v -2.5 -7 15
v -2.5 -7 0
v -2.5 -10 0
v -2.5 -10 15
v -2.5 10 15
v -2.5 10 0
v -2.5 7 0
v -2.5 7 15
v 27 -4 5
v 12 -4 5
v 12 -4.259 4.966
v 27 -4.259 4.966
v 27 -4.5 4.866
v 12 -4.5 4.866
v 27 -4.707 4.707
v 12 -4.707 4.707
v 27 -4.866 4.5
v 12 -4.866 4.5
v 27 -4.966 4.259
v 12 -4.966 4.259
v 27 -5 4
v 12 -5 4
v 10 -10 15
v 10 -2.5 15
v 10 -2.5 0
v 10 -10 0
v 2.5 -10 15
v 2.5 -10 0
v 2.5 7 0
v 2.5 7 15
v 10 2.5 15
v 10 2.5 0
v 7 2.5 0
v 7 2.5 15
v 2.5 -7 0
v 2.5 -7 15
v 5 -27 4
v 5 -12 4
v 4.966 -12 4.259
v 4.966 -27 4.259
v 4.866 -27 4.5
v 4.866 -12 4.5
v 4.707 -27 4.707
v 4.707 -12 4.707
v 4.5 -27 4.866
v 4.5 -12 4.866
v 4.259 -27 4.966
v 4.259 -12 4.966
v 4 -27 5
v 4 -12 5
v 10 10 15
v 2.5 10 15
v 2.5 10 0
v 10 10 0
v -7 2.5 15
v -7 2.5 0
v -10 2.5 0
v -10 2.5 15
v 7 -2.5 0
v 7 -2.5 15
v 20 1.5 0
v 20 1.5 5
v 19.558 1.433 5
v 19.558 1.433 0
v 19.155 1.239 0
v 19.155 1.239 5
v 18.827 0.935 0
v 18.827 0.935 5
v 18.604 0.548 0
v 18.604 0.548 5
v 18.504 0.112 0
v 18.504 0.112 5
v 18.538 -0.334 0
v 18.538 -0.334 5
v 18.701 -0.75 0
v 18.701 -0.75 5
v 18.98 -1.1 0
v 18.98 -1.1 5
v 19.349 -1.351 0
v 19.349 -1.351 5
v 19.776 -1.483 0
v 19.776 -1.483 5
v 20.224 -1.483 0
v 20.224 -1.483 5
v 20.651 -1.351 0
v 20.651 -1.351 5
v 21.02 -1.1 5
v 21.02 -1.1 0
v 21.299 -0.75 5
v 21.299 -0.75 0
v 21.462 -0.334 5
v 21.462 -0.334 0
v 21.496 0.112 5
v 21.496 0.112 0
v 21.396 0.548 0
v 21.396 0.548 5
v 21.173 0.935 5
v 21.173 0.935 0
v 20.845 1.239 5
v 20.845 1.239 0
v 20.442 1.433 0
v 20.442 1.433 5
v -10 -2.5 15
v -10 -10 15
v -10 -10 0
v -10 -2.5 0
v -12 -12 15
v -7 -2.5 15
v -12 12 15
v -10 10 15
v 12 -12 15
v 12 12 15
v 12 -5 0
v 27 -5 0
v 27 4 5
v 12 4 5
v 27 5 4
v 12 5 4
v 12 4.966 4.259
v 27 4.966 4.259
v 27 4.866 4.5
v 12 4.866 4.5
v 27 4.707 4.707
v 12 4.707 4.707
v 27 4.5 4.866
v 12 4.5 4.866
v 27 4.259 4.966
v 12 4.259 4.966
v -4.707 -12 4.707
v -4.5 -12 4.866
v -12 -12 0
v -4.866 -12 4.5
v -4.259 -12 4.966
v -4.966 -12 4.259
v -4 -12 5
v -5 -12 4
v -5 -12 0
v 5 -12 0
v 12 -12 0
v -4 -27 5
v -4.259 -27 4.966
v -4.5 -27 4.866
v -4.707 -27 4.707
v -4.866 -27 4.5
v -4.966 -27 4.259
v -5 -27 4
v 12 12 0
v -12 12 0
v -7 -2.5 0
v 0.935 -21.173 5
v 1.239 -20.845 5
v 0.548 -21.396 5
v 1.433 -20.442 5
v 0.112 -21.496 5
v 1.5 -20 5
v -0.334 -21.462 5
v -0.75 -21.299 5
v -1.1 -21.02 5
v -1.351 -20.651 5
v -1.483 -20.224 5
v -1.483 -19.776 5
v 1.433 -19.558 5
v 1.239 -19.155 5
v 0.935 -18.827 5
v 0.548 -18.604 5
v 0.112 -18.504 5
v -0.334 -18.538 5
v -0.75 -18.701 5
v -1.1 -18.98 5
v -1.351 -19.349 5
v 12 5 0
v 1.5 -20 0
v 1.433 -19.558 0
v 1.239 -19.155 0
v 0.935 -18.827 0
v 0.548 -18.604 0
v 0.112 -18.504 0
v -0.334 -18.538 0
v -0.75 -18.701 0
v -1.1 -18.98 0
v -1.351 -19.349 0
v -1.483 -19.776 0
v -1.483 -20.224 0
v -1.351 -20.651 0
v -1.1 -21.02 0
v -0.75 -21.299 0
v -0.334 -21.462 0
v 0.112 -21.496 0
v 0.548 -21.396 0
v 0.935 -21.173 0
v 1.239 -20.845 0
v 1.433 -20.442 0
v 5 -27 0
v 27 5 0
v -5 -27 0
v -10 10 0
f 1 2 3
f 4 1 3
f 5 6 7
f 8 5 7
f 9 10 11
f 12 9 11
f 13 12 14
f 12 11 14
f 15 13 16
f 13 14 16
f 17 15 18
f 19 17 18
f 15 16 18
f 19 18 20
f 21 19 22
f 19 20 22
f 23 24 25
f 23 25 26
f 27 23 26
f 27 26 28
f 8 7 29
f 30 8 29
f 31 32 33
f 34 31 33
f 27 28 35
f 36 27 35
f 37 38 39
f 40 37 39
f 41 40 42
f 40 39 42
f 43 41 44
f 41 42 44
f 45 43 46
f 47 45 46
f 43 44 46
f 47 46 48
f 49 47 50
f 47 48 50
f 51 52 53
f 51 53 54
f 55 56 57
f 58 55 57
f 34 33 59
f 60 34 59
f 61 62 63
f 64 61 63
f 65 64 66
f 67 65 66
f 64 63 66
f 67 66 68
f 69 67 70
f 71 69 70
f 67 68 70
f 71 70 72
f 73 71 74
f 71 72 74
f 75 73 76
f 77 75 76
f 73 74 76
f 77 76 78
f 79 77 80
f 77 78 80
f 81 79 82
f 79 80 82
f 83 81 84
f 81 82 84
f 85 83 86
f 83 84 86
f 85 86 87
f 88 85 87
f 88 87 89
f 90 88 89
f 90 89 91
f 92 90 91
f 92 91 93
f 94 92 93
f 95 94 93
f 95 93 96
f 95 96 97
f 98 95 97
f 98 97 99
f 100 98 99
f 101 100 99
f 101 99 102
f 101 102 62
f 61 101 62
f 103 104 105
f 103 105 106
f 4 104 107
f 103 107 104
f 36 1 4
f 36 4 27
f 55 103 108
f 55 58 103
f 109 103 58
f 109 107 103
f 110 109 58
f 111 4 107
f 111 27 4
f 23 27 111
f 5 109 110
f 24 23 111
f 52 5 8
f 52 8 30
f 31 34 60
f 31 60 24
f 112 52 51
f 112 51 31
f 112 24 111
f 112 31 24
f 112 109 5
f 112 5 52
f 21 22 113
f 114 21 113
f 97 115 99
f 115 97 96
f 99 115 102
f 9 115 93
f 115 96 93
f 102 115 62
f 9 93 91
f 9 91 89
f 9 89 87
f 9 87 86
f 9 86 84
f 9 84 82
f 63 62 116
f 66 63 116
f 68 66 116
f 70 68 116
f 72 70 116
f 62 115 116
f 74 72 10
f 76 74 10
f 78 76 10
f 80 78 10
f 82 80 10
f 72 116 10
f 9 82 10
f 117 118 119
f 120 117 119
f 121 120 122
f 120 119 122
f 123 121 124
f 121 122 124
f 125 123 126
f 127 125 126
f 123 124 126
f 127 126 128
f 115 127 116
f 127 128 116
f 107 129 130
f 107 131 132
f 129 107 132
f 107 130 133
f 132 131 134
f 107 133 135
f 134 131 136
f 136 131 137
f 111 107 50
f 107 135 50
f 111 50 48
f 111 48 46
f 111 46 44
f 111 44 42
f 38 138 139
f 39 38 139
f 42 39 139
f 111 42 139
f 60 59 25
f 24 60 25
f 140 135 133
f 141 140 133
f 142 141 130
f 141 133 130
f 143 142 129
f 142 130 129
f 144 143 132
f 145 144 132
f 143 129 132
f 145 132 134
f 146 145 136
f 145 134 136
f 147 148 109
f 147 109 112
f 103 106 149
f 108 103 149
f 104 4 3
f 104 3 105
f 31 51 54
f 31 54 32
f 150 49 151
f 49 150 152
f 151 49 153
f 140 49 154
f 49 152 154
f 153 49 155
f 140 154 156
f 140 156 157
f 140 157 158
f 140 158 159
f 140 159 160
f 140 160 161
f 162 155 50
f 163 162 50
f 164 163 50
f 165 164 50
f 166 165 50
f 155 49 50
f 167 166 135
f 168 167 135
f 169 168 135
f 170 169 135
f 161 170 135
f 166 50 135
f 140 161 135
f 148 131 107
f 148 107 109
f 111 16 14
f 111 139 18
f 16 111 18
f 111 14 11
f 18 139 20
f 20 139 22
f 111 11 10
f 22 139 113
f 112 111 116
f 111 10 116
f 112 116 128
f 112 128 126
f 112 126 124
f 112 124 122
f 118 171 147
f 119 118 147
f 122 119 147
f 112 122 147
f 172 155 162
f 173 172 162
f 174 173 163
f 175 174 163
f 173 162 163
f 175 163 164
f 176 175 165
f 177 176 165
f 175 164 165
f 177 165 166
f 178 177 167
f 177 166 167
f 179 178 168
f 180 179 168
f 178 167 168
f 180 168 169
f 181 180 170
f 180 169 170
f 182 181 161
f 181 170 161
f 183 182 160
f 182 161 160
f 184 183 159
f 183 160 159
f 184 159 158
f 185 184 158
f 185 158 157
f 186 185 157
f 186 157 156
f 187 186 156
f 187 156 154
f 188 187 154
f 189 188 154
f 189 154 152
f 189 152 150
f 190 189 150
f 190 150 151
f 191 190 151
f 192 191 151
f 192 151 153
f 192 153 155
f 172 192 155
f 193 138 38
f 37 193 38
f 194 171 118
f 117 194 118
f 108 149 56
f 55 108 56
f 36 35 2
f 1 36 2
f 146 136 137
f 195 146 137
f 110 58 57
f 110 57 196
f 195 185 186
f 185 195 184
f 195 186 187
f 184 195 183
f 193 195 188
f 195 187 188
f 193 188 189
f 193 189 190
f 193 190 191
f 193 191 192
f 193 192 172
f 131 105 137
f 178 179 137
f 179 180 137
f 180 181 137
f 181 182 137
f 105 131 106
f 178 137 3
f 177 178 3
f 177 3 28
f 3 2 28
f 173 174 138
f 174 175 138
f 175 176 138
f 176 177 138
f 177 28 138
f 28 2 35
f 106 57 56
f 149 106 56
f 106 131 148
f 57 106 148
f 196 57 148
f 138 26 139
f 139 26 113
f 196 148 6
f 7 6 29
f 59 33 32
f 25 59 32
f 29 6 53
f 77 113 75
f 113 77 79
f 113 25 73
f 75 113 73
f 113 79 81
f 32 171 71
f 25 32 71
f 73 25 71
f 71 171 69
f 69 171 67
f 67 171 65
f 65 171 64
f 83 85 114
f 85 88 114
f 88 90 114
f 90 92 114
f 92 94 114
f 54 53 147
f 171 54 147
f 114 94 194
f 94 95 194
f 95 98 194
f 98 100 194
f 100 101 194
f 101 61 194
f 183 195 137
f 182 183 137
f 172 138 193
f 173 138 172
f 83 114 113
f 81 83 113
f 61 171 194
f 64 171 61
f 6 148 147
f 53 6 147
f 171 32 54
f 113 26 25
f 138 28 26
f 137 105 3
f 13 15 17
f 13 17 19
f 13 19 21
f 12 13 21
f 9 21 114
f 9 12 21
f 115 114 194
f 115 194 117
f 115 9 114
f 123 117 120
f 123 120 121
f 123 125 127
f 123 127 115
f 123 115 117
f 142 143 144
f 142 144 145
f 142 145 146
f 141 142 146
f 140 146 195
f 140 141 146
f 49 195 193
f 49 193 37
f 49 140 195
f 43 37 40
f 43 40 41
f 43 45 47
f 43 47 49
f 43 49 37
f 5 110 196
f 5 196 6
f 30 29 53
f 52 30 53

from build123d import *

# Parameters (mm, degrees)
SKETCH2_W           = 24
SKETCH2_H           = 24
BOSS_EXTRUDE1_DEPTH = 15
BOSS_EXTRUDE2_DEPTH = 15
CUT_EXTRUDE1_REACH  = 33.193
SKETCH4_R           = 1.5
CIRPATTERN1_COUNT   = 2
CIRPATTERN1_ANGLE   = 90


with BuildPart() as part:
    # Sketch2 → Boss-Extrude1 (new body)
    with BuildSketch(Plane.XY):
        Rectangle(SKETCH2_W, SKETCH2_H)
        Polygon((-2.5, 10), (-2.5, 7), (2.5, 7), (2.5, 10), (10, 10), (10, 2.5), (7, 2.5), (7, -2.5), (10, -2.5), (10, -10), (2.5, -10), (2.5, -7), (-2.5, -7), (-2.5, -10), (-10, -10), (-10, -2.5), (-7, -2.5), (-7, 2.5), (-10, 2.5), (-10, 10), align=None, mode=Mode.SUBTRACT)
    extrude(amount=BOSS_EXTRUDE1_DEPTH)

    # Sketch3 → Boss-Extrude2 (add)
    with BuildSketch(Plane.XZ.offset(12)):
        with BuildLine():
            Line((-5, 4), (-5, 0))
            Line((-5, 0), (5, 0))
            Line((5, 0), (5, 4))
            ThreePointArc((5, 4), (4.707106781, 4.707106781), (4, 5))
            Line((4, 5), (-4, 5))
            ThreePointArc((-4, 5), (-4.707106781, 4.707106781), (-5, 4))
        make_face()
    boss_extrude2 = extrude(amount=BOSS_EXTRUDE2_DEPTH)

    # Sketch4 → Cut-Extrude1 (cut, up to next)
    with BuildSketch(Plane.XY.offset(5), mode=Mode.PRIVATE) as cut_extrude1_sk1:
        with Locations((0, -20)):
            Circle(SKETCH4_R)
    cut_extrude1_tool1 = extrude(cut_extrude1_sk1.sketch, amount=-CUT_EXTRUDE1_REACH, mode=Mode.PRIVATE) & part.part
    cut_extrude1 = cut_extrude1_tool1.solids().sort_by_distance((0, -20, 5))[0]
    add(cut_extrude1, mode=Mode.SUBTRACT)

    # CirPattern1: Boss-Extrude2, Cut-Extrude1 ×2 about axis
    cirpattern1_axis = Axis((0, 0, 0), (0, 0, 1))
    add([boss_extrude2.rotate(cirpattern1_axis, i * CIRPATTERN1_ANGLE / (CIRPATTERN1_COUNT - 1)) for i in range(1, CIRPATTERN1_COUNT)])
    add([cut_extrude1.rotate(cirpattern1_axis, i * CIRPATTERN1_ANGLE / (CIRPATTERN1_COUNT - 1)) for i in range(1, CIRPATTERN1_COUNT)], mode=Mode.SUBTRACT)


solid = part.part
